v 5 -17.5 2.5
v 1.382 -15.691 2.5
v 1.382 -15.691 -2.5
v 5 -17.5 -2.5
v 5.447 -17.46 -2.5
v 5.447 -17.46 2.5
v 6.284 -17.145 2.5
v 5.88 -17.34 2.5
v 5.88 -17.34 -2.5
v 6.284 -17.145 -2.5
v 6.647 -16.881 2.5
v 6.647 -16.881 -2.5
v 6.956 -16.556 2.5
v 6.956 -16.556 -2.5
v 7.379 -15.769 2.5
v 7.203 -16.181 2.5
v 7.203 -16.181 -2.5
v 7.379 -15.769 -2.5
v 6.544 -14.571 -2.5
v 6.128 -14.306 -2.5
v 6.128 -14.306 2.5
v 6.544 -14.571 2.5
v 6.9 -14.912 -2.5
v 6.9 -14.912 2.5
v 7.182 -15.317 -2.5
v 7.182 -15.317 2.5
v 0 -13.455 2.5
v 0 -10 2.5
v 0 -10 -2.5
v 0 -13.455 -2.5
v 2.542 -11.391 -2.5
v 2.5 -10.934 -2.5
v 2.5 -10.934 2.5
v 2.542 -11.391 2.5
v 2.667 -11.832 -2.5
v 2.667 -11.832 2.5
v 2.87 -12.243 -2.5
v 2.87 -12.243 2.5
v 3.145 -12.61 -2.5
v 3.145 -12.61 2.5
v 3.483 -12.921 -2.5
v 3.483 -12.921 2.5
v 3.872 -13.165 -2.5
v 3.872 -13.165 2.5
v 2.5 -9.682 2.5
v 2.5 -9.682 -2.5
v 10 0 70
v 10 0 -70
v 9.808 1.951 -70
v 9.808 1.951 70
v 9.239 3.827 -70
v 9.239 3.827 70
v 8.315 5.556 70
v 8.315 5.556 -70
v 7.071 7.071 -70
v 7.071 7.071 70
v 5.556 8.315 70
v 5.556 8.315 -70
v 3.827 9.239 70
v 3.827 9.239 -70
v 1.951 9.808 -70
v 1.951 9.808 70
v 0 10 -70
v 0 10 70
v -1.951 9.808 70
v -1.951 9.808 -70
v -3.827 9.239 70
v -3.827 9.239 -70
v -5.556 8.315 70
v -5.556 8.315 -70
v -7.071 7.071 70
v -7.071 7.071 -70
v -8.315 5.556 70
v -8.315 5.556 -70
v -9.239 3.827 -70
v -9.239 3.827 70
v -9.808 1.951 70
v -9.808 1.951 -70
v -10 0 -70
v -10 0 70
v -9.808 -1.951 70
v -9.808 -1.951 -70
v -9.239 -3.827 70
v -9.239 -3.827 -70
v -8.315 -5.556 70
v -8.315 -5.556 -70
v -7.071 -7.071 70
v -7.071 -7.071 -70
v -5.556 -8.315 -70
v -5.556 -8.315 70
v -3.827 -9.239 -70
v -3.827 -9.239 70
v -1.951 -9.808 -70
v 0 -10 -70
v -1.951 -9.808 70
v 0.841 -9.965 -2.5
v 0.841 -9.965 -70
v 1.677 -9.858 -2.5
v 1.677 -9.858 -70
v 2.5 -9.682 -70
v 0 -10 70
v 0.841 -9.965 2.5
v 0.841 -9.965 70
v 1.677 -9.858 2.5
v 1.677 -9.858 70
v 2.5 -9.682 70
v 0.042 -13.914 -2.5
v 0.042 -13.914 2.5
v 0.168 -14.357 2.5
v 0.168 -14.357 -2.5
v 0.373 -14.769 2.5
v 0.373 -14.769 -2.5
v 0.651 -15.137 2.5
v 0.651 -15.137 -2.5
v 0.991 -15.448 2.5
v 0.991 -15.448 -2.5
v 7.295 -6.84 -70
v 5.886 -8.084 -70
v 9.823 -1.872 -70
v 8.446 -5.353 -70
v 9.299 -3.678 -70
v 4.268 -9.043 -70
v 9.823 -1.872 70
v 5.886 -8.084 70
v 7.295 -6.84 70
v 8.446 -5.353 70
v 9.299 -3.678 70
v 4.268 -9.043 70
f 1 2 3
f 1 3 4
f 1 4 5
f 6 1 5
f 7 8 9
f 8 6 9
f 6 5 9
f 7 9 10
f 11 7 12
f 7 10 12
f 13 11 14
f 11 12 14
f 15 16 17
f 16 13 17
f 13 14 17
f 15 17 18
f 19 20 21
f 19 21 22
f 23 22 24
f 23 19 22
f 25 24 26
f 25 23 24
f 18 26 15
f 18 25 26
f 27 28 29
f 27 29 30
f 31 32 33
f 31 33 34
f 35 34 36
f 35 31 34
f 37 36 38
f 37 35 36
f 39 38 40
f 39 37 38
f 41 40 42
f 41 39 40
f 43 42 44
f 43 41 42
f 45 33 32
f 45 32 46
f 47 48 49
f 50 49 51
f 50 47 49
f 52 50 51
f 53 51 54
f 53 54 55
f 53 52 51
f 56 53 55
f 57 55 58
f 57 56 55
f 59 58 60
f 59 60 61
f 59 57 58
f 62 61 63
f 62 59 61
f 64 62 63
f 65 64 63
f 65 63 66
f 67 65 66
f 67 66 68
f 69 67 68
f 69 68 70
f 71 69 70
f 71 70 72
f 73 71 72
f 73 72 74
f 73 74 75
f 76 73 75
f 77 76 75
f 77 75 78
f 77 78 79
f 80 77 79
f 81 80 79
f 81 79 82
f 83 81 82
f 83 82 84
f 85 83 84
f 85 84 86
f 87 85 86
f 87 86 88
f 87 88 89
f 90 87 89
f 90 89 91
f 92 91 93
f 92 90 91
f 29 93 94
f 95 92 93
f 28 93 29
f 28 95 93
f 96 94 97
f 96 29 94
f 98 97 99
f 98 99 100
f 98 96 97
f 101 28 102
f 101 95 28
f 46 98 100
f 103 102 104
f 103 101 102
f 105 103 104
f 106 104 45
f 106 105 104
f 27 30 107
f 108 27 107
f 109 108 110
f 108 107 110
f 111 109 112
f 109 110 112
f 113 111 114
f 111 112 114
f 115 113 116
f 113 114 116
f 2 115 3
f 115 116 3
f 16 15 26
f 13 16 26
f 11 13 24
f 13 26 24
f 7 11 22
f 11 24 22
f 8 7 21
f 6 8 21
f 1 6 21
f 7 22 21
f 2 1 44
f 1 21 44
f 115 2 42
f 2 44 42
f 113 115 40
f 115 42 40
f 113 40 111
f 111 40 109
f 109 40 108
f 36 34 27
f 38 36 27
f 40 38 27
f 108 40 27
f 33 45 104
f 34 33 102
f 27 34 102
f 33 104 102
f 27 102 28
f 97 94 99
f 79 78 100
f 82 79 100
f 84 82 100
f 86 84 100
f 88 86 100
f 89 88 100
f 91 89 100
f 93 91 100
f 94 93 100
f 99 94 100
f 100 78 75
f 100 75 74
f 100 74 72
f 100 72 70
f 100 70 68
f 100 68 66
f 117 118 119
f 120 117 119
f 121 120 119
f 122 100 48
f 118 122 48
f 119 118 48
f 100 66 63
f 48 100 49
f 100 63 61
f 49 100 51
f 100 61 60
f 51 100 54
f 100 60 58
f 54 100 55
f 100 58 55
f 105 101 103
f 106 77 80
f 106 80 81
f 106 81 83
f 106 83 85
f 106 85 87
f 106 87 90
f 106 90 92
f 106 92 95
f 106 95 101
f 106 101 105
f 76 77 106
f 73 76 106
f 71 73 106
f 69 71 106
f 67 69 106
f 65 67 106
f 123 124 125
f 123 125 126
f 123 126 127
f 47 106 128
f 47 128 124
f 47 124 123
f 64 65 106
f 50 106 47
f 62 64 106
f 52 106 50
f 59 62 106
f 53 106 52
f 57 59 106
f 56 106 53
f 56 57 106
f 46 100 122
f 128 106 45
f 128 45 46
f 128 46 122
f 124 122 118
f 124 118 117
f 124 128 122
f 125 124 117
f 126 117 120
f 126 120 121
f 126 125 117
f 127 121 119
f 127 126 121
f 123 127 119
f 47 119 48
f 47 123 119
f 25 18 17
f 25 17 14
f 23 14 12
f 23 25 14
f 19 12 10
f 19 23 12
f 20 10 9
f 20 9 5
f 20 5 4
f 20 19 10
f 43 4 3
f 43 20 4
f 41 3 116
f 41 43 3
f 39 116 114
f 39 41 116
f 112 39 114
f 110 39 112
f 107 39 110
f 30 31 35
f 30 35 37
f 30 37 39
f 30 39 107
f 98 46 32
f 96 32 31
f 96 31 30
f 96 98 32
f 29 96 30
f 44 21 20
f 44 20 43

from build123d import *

# Parameters (mm, degrees)
F1_DEPTH    = 70
F2_DEPTH    = 2.5
F3_T1_DEPTH = 5
F3_T3_DEPTH = 12.6854399108
F3_T5_DEPTH = 17.5
F3_T7_DEPTH = 12.7254248594


# Not quite as in the source:
# - a fillet or chamfer that OpenCascade refuses, or shapes differently, is made with other operations: its cross-section is extruded or revolved along the edge and cut away or added


with BuildPart() as f1:
    # F0 (on Top) → F1 (new body, symmetric)
    with BuildSketch(Plane.XY):
        with BuildLine():
            ThreePointArc((2.5, -9.6824583655), (7.9056941504, -6.123724357), (10, 0))
            ThreePointArc((10, 0), (-7.0710678119, 7.0710678119), (0, -10))
            ThreePointArc((0, -10), (1.2600429248, -9.9202969627), (2.5, -9.6824583655))
        make_face()
    extrude(amount=F1_DEPTH, both=True)

    # F0 (on Top) → F2 (join, symmetric)
    with BuildSketch(Plane.XY):
        with BuildLine():
            ThreePointArc((2.5, -9.6824583655), (1.2600429248, -9.9202969627), (0, -10))
            Line((0, -10), (0, -12.4709576939))
            Line((0, -12.4709576939), (2.5, -12.4709576939))
            Line((2.5, -12.4709576939), (2.5, -9.6824583655))
        make_face()
        Polygon((2.5, -12.4709576939), (0, -12.4709576939), (0, -15), (5, -17.5), (7.5, -17.5), (7.5, -15), align=None)
    extrude(amount=F2_DEPTH, both=True)

    # F3: fillet of radius 2.5 on 4 edges, made by hand

    # F3_s2 → F3_t1 (join)
    with BuildSketch(Plane.XY.offset(-2.5)):
        with BuildLine():
            ThreePointArc((2.5, -10.9338697117), (2.8703321066, -12.2432644817), (3.871611731, -13.1647305129))
            Line((3.871611731, -13.1647305129), (2.5, -12.4709576939))
            Line((2.5, -12.4709576939), (2.5, -10.9338697117))
        make_face()
    extrude(amount=F3_T1_DEPTH)

    # F3_s4 → F3_t3 (cut)
    with BuildSketch(Plane.XY.offset(-6.3427199554)):
        with BuildLine():
            ThreePointArc((6.128388269, -14.306227181), (7.1296678934, -15.2276932122), (7.5, -16.5370879822))
            Line((7.5, -16.5370879822), (7.5, -15))
            Line((7.5, -15), (6.128388269, -14.306227181))
        make_face()
    extrude(amount=F3_T3_DEPTH, mode=Mode.SUBTRACT)

    # F3_s6 → F3_t5 (cut)
    with BuildSketch(Plane.XY.offset(-8.75)):
        with BuildLine():
            ThreePointArc((5, -17.5), (6.767766953, -16.767766953), (7.5, -15))
            Line((7.5, -15), (7.5, -17.5))
            Line((7.5, -17.5), (5, -17.5))
        make_face()
    extrude(amount=F3_T5_DEPTH, mode=Mode.SUBTRACT)

    # F3_s8 → F3_t7 (cut)
    with BuildSketch(Plane.XY.offset(-6.3627124297)):
        with BuildLine():
            ThreePointArc((0, -13.4549150281), (0.3733729791, -14.7692428084), (1.3819660113, -15.6909830056))
            Line((1.3819660113, -15.6909830056), (0, -15))
            Line((0, -15), (0, -13.4549150281))
        make_face()
    extrude(amount=F3_T7_DEPTH, mode=Mode.SUBTRACT)


solid = f1.part
